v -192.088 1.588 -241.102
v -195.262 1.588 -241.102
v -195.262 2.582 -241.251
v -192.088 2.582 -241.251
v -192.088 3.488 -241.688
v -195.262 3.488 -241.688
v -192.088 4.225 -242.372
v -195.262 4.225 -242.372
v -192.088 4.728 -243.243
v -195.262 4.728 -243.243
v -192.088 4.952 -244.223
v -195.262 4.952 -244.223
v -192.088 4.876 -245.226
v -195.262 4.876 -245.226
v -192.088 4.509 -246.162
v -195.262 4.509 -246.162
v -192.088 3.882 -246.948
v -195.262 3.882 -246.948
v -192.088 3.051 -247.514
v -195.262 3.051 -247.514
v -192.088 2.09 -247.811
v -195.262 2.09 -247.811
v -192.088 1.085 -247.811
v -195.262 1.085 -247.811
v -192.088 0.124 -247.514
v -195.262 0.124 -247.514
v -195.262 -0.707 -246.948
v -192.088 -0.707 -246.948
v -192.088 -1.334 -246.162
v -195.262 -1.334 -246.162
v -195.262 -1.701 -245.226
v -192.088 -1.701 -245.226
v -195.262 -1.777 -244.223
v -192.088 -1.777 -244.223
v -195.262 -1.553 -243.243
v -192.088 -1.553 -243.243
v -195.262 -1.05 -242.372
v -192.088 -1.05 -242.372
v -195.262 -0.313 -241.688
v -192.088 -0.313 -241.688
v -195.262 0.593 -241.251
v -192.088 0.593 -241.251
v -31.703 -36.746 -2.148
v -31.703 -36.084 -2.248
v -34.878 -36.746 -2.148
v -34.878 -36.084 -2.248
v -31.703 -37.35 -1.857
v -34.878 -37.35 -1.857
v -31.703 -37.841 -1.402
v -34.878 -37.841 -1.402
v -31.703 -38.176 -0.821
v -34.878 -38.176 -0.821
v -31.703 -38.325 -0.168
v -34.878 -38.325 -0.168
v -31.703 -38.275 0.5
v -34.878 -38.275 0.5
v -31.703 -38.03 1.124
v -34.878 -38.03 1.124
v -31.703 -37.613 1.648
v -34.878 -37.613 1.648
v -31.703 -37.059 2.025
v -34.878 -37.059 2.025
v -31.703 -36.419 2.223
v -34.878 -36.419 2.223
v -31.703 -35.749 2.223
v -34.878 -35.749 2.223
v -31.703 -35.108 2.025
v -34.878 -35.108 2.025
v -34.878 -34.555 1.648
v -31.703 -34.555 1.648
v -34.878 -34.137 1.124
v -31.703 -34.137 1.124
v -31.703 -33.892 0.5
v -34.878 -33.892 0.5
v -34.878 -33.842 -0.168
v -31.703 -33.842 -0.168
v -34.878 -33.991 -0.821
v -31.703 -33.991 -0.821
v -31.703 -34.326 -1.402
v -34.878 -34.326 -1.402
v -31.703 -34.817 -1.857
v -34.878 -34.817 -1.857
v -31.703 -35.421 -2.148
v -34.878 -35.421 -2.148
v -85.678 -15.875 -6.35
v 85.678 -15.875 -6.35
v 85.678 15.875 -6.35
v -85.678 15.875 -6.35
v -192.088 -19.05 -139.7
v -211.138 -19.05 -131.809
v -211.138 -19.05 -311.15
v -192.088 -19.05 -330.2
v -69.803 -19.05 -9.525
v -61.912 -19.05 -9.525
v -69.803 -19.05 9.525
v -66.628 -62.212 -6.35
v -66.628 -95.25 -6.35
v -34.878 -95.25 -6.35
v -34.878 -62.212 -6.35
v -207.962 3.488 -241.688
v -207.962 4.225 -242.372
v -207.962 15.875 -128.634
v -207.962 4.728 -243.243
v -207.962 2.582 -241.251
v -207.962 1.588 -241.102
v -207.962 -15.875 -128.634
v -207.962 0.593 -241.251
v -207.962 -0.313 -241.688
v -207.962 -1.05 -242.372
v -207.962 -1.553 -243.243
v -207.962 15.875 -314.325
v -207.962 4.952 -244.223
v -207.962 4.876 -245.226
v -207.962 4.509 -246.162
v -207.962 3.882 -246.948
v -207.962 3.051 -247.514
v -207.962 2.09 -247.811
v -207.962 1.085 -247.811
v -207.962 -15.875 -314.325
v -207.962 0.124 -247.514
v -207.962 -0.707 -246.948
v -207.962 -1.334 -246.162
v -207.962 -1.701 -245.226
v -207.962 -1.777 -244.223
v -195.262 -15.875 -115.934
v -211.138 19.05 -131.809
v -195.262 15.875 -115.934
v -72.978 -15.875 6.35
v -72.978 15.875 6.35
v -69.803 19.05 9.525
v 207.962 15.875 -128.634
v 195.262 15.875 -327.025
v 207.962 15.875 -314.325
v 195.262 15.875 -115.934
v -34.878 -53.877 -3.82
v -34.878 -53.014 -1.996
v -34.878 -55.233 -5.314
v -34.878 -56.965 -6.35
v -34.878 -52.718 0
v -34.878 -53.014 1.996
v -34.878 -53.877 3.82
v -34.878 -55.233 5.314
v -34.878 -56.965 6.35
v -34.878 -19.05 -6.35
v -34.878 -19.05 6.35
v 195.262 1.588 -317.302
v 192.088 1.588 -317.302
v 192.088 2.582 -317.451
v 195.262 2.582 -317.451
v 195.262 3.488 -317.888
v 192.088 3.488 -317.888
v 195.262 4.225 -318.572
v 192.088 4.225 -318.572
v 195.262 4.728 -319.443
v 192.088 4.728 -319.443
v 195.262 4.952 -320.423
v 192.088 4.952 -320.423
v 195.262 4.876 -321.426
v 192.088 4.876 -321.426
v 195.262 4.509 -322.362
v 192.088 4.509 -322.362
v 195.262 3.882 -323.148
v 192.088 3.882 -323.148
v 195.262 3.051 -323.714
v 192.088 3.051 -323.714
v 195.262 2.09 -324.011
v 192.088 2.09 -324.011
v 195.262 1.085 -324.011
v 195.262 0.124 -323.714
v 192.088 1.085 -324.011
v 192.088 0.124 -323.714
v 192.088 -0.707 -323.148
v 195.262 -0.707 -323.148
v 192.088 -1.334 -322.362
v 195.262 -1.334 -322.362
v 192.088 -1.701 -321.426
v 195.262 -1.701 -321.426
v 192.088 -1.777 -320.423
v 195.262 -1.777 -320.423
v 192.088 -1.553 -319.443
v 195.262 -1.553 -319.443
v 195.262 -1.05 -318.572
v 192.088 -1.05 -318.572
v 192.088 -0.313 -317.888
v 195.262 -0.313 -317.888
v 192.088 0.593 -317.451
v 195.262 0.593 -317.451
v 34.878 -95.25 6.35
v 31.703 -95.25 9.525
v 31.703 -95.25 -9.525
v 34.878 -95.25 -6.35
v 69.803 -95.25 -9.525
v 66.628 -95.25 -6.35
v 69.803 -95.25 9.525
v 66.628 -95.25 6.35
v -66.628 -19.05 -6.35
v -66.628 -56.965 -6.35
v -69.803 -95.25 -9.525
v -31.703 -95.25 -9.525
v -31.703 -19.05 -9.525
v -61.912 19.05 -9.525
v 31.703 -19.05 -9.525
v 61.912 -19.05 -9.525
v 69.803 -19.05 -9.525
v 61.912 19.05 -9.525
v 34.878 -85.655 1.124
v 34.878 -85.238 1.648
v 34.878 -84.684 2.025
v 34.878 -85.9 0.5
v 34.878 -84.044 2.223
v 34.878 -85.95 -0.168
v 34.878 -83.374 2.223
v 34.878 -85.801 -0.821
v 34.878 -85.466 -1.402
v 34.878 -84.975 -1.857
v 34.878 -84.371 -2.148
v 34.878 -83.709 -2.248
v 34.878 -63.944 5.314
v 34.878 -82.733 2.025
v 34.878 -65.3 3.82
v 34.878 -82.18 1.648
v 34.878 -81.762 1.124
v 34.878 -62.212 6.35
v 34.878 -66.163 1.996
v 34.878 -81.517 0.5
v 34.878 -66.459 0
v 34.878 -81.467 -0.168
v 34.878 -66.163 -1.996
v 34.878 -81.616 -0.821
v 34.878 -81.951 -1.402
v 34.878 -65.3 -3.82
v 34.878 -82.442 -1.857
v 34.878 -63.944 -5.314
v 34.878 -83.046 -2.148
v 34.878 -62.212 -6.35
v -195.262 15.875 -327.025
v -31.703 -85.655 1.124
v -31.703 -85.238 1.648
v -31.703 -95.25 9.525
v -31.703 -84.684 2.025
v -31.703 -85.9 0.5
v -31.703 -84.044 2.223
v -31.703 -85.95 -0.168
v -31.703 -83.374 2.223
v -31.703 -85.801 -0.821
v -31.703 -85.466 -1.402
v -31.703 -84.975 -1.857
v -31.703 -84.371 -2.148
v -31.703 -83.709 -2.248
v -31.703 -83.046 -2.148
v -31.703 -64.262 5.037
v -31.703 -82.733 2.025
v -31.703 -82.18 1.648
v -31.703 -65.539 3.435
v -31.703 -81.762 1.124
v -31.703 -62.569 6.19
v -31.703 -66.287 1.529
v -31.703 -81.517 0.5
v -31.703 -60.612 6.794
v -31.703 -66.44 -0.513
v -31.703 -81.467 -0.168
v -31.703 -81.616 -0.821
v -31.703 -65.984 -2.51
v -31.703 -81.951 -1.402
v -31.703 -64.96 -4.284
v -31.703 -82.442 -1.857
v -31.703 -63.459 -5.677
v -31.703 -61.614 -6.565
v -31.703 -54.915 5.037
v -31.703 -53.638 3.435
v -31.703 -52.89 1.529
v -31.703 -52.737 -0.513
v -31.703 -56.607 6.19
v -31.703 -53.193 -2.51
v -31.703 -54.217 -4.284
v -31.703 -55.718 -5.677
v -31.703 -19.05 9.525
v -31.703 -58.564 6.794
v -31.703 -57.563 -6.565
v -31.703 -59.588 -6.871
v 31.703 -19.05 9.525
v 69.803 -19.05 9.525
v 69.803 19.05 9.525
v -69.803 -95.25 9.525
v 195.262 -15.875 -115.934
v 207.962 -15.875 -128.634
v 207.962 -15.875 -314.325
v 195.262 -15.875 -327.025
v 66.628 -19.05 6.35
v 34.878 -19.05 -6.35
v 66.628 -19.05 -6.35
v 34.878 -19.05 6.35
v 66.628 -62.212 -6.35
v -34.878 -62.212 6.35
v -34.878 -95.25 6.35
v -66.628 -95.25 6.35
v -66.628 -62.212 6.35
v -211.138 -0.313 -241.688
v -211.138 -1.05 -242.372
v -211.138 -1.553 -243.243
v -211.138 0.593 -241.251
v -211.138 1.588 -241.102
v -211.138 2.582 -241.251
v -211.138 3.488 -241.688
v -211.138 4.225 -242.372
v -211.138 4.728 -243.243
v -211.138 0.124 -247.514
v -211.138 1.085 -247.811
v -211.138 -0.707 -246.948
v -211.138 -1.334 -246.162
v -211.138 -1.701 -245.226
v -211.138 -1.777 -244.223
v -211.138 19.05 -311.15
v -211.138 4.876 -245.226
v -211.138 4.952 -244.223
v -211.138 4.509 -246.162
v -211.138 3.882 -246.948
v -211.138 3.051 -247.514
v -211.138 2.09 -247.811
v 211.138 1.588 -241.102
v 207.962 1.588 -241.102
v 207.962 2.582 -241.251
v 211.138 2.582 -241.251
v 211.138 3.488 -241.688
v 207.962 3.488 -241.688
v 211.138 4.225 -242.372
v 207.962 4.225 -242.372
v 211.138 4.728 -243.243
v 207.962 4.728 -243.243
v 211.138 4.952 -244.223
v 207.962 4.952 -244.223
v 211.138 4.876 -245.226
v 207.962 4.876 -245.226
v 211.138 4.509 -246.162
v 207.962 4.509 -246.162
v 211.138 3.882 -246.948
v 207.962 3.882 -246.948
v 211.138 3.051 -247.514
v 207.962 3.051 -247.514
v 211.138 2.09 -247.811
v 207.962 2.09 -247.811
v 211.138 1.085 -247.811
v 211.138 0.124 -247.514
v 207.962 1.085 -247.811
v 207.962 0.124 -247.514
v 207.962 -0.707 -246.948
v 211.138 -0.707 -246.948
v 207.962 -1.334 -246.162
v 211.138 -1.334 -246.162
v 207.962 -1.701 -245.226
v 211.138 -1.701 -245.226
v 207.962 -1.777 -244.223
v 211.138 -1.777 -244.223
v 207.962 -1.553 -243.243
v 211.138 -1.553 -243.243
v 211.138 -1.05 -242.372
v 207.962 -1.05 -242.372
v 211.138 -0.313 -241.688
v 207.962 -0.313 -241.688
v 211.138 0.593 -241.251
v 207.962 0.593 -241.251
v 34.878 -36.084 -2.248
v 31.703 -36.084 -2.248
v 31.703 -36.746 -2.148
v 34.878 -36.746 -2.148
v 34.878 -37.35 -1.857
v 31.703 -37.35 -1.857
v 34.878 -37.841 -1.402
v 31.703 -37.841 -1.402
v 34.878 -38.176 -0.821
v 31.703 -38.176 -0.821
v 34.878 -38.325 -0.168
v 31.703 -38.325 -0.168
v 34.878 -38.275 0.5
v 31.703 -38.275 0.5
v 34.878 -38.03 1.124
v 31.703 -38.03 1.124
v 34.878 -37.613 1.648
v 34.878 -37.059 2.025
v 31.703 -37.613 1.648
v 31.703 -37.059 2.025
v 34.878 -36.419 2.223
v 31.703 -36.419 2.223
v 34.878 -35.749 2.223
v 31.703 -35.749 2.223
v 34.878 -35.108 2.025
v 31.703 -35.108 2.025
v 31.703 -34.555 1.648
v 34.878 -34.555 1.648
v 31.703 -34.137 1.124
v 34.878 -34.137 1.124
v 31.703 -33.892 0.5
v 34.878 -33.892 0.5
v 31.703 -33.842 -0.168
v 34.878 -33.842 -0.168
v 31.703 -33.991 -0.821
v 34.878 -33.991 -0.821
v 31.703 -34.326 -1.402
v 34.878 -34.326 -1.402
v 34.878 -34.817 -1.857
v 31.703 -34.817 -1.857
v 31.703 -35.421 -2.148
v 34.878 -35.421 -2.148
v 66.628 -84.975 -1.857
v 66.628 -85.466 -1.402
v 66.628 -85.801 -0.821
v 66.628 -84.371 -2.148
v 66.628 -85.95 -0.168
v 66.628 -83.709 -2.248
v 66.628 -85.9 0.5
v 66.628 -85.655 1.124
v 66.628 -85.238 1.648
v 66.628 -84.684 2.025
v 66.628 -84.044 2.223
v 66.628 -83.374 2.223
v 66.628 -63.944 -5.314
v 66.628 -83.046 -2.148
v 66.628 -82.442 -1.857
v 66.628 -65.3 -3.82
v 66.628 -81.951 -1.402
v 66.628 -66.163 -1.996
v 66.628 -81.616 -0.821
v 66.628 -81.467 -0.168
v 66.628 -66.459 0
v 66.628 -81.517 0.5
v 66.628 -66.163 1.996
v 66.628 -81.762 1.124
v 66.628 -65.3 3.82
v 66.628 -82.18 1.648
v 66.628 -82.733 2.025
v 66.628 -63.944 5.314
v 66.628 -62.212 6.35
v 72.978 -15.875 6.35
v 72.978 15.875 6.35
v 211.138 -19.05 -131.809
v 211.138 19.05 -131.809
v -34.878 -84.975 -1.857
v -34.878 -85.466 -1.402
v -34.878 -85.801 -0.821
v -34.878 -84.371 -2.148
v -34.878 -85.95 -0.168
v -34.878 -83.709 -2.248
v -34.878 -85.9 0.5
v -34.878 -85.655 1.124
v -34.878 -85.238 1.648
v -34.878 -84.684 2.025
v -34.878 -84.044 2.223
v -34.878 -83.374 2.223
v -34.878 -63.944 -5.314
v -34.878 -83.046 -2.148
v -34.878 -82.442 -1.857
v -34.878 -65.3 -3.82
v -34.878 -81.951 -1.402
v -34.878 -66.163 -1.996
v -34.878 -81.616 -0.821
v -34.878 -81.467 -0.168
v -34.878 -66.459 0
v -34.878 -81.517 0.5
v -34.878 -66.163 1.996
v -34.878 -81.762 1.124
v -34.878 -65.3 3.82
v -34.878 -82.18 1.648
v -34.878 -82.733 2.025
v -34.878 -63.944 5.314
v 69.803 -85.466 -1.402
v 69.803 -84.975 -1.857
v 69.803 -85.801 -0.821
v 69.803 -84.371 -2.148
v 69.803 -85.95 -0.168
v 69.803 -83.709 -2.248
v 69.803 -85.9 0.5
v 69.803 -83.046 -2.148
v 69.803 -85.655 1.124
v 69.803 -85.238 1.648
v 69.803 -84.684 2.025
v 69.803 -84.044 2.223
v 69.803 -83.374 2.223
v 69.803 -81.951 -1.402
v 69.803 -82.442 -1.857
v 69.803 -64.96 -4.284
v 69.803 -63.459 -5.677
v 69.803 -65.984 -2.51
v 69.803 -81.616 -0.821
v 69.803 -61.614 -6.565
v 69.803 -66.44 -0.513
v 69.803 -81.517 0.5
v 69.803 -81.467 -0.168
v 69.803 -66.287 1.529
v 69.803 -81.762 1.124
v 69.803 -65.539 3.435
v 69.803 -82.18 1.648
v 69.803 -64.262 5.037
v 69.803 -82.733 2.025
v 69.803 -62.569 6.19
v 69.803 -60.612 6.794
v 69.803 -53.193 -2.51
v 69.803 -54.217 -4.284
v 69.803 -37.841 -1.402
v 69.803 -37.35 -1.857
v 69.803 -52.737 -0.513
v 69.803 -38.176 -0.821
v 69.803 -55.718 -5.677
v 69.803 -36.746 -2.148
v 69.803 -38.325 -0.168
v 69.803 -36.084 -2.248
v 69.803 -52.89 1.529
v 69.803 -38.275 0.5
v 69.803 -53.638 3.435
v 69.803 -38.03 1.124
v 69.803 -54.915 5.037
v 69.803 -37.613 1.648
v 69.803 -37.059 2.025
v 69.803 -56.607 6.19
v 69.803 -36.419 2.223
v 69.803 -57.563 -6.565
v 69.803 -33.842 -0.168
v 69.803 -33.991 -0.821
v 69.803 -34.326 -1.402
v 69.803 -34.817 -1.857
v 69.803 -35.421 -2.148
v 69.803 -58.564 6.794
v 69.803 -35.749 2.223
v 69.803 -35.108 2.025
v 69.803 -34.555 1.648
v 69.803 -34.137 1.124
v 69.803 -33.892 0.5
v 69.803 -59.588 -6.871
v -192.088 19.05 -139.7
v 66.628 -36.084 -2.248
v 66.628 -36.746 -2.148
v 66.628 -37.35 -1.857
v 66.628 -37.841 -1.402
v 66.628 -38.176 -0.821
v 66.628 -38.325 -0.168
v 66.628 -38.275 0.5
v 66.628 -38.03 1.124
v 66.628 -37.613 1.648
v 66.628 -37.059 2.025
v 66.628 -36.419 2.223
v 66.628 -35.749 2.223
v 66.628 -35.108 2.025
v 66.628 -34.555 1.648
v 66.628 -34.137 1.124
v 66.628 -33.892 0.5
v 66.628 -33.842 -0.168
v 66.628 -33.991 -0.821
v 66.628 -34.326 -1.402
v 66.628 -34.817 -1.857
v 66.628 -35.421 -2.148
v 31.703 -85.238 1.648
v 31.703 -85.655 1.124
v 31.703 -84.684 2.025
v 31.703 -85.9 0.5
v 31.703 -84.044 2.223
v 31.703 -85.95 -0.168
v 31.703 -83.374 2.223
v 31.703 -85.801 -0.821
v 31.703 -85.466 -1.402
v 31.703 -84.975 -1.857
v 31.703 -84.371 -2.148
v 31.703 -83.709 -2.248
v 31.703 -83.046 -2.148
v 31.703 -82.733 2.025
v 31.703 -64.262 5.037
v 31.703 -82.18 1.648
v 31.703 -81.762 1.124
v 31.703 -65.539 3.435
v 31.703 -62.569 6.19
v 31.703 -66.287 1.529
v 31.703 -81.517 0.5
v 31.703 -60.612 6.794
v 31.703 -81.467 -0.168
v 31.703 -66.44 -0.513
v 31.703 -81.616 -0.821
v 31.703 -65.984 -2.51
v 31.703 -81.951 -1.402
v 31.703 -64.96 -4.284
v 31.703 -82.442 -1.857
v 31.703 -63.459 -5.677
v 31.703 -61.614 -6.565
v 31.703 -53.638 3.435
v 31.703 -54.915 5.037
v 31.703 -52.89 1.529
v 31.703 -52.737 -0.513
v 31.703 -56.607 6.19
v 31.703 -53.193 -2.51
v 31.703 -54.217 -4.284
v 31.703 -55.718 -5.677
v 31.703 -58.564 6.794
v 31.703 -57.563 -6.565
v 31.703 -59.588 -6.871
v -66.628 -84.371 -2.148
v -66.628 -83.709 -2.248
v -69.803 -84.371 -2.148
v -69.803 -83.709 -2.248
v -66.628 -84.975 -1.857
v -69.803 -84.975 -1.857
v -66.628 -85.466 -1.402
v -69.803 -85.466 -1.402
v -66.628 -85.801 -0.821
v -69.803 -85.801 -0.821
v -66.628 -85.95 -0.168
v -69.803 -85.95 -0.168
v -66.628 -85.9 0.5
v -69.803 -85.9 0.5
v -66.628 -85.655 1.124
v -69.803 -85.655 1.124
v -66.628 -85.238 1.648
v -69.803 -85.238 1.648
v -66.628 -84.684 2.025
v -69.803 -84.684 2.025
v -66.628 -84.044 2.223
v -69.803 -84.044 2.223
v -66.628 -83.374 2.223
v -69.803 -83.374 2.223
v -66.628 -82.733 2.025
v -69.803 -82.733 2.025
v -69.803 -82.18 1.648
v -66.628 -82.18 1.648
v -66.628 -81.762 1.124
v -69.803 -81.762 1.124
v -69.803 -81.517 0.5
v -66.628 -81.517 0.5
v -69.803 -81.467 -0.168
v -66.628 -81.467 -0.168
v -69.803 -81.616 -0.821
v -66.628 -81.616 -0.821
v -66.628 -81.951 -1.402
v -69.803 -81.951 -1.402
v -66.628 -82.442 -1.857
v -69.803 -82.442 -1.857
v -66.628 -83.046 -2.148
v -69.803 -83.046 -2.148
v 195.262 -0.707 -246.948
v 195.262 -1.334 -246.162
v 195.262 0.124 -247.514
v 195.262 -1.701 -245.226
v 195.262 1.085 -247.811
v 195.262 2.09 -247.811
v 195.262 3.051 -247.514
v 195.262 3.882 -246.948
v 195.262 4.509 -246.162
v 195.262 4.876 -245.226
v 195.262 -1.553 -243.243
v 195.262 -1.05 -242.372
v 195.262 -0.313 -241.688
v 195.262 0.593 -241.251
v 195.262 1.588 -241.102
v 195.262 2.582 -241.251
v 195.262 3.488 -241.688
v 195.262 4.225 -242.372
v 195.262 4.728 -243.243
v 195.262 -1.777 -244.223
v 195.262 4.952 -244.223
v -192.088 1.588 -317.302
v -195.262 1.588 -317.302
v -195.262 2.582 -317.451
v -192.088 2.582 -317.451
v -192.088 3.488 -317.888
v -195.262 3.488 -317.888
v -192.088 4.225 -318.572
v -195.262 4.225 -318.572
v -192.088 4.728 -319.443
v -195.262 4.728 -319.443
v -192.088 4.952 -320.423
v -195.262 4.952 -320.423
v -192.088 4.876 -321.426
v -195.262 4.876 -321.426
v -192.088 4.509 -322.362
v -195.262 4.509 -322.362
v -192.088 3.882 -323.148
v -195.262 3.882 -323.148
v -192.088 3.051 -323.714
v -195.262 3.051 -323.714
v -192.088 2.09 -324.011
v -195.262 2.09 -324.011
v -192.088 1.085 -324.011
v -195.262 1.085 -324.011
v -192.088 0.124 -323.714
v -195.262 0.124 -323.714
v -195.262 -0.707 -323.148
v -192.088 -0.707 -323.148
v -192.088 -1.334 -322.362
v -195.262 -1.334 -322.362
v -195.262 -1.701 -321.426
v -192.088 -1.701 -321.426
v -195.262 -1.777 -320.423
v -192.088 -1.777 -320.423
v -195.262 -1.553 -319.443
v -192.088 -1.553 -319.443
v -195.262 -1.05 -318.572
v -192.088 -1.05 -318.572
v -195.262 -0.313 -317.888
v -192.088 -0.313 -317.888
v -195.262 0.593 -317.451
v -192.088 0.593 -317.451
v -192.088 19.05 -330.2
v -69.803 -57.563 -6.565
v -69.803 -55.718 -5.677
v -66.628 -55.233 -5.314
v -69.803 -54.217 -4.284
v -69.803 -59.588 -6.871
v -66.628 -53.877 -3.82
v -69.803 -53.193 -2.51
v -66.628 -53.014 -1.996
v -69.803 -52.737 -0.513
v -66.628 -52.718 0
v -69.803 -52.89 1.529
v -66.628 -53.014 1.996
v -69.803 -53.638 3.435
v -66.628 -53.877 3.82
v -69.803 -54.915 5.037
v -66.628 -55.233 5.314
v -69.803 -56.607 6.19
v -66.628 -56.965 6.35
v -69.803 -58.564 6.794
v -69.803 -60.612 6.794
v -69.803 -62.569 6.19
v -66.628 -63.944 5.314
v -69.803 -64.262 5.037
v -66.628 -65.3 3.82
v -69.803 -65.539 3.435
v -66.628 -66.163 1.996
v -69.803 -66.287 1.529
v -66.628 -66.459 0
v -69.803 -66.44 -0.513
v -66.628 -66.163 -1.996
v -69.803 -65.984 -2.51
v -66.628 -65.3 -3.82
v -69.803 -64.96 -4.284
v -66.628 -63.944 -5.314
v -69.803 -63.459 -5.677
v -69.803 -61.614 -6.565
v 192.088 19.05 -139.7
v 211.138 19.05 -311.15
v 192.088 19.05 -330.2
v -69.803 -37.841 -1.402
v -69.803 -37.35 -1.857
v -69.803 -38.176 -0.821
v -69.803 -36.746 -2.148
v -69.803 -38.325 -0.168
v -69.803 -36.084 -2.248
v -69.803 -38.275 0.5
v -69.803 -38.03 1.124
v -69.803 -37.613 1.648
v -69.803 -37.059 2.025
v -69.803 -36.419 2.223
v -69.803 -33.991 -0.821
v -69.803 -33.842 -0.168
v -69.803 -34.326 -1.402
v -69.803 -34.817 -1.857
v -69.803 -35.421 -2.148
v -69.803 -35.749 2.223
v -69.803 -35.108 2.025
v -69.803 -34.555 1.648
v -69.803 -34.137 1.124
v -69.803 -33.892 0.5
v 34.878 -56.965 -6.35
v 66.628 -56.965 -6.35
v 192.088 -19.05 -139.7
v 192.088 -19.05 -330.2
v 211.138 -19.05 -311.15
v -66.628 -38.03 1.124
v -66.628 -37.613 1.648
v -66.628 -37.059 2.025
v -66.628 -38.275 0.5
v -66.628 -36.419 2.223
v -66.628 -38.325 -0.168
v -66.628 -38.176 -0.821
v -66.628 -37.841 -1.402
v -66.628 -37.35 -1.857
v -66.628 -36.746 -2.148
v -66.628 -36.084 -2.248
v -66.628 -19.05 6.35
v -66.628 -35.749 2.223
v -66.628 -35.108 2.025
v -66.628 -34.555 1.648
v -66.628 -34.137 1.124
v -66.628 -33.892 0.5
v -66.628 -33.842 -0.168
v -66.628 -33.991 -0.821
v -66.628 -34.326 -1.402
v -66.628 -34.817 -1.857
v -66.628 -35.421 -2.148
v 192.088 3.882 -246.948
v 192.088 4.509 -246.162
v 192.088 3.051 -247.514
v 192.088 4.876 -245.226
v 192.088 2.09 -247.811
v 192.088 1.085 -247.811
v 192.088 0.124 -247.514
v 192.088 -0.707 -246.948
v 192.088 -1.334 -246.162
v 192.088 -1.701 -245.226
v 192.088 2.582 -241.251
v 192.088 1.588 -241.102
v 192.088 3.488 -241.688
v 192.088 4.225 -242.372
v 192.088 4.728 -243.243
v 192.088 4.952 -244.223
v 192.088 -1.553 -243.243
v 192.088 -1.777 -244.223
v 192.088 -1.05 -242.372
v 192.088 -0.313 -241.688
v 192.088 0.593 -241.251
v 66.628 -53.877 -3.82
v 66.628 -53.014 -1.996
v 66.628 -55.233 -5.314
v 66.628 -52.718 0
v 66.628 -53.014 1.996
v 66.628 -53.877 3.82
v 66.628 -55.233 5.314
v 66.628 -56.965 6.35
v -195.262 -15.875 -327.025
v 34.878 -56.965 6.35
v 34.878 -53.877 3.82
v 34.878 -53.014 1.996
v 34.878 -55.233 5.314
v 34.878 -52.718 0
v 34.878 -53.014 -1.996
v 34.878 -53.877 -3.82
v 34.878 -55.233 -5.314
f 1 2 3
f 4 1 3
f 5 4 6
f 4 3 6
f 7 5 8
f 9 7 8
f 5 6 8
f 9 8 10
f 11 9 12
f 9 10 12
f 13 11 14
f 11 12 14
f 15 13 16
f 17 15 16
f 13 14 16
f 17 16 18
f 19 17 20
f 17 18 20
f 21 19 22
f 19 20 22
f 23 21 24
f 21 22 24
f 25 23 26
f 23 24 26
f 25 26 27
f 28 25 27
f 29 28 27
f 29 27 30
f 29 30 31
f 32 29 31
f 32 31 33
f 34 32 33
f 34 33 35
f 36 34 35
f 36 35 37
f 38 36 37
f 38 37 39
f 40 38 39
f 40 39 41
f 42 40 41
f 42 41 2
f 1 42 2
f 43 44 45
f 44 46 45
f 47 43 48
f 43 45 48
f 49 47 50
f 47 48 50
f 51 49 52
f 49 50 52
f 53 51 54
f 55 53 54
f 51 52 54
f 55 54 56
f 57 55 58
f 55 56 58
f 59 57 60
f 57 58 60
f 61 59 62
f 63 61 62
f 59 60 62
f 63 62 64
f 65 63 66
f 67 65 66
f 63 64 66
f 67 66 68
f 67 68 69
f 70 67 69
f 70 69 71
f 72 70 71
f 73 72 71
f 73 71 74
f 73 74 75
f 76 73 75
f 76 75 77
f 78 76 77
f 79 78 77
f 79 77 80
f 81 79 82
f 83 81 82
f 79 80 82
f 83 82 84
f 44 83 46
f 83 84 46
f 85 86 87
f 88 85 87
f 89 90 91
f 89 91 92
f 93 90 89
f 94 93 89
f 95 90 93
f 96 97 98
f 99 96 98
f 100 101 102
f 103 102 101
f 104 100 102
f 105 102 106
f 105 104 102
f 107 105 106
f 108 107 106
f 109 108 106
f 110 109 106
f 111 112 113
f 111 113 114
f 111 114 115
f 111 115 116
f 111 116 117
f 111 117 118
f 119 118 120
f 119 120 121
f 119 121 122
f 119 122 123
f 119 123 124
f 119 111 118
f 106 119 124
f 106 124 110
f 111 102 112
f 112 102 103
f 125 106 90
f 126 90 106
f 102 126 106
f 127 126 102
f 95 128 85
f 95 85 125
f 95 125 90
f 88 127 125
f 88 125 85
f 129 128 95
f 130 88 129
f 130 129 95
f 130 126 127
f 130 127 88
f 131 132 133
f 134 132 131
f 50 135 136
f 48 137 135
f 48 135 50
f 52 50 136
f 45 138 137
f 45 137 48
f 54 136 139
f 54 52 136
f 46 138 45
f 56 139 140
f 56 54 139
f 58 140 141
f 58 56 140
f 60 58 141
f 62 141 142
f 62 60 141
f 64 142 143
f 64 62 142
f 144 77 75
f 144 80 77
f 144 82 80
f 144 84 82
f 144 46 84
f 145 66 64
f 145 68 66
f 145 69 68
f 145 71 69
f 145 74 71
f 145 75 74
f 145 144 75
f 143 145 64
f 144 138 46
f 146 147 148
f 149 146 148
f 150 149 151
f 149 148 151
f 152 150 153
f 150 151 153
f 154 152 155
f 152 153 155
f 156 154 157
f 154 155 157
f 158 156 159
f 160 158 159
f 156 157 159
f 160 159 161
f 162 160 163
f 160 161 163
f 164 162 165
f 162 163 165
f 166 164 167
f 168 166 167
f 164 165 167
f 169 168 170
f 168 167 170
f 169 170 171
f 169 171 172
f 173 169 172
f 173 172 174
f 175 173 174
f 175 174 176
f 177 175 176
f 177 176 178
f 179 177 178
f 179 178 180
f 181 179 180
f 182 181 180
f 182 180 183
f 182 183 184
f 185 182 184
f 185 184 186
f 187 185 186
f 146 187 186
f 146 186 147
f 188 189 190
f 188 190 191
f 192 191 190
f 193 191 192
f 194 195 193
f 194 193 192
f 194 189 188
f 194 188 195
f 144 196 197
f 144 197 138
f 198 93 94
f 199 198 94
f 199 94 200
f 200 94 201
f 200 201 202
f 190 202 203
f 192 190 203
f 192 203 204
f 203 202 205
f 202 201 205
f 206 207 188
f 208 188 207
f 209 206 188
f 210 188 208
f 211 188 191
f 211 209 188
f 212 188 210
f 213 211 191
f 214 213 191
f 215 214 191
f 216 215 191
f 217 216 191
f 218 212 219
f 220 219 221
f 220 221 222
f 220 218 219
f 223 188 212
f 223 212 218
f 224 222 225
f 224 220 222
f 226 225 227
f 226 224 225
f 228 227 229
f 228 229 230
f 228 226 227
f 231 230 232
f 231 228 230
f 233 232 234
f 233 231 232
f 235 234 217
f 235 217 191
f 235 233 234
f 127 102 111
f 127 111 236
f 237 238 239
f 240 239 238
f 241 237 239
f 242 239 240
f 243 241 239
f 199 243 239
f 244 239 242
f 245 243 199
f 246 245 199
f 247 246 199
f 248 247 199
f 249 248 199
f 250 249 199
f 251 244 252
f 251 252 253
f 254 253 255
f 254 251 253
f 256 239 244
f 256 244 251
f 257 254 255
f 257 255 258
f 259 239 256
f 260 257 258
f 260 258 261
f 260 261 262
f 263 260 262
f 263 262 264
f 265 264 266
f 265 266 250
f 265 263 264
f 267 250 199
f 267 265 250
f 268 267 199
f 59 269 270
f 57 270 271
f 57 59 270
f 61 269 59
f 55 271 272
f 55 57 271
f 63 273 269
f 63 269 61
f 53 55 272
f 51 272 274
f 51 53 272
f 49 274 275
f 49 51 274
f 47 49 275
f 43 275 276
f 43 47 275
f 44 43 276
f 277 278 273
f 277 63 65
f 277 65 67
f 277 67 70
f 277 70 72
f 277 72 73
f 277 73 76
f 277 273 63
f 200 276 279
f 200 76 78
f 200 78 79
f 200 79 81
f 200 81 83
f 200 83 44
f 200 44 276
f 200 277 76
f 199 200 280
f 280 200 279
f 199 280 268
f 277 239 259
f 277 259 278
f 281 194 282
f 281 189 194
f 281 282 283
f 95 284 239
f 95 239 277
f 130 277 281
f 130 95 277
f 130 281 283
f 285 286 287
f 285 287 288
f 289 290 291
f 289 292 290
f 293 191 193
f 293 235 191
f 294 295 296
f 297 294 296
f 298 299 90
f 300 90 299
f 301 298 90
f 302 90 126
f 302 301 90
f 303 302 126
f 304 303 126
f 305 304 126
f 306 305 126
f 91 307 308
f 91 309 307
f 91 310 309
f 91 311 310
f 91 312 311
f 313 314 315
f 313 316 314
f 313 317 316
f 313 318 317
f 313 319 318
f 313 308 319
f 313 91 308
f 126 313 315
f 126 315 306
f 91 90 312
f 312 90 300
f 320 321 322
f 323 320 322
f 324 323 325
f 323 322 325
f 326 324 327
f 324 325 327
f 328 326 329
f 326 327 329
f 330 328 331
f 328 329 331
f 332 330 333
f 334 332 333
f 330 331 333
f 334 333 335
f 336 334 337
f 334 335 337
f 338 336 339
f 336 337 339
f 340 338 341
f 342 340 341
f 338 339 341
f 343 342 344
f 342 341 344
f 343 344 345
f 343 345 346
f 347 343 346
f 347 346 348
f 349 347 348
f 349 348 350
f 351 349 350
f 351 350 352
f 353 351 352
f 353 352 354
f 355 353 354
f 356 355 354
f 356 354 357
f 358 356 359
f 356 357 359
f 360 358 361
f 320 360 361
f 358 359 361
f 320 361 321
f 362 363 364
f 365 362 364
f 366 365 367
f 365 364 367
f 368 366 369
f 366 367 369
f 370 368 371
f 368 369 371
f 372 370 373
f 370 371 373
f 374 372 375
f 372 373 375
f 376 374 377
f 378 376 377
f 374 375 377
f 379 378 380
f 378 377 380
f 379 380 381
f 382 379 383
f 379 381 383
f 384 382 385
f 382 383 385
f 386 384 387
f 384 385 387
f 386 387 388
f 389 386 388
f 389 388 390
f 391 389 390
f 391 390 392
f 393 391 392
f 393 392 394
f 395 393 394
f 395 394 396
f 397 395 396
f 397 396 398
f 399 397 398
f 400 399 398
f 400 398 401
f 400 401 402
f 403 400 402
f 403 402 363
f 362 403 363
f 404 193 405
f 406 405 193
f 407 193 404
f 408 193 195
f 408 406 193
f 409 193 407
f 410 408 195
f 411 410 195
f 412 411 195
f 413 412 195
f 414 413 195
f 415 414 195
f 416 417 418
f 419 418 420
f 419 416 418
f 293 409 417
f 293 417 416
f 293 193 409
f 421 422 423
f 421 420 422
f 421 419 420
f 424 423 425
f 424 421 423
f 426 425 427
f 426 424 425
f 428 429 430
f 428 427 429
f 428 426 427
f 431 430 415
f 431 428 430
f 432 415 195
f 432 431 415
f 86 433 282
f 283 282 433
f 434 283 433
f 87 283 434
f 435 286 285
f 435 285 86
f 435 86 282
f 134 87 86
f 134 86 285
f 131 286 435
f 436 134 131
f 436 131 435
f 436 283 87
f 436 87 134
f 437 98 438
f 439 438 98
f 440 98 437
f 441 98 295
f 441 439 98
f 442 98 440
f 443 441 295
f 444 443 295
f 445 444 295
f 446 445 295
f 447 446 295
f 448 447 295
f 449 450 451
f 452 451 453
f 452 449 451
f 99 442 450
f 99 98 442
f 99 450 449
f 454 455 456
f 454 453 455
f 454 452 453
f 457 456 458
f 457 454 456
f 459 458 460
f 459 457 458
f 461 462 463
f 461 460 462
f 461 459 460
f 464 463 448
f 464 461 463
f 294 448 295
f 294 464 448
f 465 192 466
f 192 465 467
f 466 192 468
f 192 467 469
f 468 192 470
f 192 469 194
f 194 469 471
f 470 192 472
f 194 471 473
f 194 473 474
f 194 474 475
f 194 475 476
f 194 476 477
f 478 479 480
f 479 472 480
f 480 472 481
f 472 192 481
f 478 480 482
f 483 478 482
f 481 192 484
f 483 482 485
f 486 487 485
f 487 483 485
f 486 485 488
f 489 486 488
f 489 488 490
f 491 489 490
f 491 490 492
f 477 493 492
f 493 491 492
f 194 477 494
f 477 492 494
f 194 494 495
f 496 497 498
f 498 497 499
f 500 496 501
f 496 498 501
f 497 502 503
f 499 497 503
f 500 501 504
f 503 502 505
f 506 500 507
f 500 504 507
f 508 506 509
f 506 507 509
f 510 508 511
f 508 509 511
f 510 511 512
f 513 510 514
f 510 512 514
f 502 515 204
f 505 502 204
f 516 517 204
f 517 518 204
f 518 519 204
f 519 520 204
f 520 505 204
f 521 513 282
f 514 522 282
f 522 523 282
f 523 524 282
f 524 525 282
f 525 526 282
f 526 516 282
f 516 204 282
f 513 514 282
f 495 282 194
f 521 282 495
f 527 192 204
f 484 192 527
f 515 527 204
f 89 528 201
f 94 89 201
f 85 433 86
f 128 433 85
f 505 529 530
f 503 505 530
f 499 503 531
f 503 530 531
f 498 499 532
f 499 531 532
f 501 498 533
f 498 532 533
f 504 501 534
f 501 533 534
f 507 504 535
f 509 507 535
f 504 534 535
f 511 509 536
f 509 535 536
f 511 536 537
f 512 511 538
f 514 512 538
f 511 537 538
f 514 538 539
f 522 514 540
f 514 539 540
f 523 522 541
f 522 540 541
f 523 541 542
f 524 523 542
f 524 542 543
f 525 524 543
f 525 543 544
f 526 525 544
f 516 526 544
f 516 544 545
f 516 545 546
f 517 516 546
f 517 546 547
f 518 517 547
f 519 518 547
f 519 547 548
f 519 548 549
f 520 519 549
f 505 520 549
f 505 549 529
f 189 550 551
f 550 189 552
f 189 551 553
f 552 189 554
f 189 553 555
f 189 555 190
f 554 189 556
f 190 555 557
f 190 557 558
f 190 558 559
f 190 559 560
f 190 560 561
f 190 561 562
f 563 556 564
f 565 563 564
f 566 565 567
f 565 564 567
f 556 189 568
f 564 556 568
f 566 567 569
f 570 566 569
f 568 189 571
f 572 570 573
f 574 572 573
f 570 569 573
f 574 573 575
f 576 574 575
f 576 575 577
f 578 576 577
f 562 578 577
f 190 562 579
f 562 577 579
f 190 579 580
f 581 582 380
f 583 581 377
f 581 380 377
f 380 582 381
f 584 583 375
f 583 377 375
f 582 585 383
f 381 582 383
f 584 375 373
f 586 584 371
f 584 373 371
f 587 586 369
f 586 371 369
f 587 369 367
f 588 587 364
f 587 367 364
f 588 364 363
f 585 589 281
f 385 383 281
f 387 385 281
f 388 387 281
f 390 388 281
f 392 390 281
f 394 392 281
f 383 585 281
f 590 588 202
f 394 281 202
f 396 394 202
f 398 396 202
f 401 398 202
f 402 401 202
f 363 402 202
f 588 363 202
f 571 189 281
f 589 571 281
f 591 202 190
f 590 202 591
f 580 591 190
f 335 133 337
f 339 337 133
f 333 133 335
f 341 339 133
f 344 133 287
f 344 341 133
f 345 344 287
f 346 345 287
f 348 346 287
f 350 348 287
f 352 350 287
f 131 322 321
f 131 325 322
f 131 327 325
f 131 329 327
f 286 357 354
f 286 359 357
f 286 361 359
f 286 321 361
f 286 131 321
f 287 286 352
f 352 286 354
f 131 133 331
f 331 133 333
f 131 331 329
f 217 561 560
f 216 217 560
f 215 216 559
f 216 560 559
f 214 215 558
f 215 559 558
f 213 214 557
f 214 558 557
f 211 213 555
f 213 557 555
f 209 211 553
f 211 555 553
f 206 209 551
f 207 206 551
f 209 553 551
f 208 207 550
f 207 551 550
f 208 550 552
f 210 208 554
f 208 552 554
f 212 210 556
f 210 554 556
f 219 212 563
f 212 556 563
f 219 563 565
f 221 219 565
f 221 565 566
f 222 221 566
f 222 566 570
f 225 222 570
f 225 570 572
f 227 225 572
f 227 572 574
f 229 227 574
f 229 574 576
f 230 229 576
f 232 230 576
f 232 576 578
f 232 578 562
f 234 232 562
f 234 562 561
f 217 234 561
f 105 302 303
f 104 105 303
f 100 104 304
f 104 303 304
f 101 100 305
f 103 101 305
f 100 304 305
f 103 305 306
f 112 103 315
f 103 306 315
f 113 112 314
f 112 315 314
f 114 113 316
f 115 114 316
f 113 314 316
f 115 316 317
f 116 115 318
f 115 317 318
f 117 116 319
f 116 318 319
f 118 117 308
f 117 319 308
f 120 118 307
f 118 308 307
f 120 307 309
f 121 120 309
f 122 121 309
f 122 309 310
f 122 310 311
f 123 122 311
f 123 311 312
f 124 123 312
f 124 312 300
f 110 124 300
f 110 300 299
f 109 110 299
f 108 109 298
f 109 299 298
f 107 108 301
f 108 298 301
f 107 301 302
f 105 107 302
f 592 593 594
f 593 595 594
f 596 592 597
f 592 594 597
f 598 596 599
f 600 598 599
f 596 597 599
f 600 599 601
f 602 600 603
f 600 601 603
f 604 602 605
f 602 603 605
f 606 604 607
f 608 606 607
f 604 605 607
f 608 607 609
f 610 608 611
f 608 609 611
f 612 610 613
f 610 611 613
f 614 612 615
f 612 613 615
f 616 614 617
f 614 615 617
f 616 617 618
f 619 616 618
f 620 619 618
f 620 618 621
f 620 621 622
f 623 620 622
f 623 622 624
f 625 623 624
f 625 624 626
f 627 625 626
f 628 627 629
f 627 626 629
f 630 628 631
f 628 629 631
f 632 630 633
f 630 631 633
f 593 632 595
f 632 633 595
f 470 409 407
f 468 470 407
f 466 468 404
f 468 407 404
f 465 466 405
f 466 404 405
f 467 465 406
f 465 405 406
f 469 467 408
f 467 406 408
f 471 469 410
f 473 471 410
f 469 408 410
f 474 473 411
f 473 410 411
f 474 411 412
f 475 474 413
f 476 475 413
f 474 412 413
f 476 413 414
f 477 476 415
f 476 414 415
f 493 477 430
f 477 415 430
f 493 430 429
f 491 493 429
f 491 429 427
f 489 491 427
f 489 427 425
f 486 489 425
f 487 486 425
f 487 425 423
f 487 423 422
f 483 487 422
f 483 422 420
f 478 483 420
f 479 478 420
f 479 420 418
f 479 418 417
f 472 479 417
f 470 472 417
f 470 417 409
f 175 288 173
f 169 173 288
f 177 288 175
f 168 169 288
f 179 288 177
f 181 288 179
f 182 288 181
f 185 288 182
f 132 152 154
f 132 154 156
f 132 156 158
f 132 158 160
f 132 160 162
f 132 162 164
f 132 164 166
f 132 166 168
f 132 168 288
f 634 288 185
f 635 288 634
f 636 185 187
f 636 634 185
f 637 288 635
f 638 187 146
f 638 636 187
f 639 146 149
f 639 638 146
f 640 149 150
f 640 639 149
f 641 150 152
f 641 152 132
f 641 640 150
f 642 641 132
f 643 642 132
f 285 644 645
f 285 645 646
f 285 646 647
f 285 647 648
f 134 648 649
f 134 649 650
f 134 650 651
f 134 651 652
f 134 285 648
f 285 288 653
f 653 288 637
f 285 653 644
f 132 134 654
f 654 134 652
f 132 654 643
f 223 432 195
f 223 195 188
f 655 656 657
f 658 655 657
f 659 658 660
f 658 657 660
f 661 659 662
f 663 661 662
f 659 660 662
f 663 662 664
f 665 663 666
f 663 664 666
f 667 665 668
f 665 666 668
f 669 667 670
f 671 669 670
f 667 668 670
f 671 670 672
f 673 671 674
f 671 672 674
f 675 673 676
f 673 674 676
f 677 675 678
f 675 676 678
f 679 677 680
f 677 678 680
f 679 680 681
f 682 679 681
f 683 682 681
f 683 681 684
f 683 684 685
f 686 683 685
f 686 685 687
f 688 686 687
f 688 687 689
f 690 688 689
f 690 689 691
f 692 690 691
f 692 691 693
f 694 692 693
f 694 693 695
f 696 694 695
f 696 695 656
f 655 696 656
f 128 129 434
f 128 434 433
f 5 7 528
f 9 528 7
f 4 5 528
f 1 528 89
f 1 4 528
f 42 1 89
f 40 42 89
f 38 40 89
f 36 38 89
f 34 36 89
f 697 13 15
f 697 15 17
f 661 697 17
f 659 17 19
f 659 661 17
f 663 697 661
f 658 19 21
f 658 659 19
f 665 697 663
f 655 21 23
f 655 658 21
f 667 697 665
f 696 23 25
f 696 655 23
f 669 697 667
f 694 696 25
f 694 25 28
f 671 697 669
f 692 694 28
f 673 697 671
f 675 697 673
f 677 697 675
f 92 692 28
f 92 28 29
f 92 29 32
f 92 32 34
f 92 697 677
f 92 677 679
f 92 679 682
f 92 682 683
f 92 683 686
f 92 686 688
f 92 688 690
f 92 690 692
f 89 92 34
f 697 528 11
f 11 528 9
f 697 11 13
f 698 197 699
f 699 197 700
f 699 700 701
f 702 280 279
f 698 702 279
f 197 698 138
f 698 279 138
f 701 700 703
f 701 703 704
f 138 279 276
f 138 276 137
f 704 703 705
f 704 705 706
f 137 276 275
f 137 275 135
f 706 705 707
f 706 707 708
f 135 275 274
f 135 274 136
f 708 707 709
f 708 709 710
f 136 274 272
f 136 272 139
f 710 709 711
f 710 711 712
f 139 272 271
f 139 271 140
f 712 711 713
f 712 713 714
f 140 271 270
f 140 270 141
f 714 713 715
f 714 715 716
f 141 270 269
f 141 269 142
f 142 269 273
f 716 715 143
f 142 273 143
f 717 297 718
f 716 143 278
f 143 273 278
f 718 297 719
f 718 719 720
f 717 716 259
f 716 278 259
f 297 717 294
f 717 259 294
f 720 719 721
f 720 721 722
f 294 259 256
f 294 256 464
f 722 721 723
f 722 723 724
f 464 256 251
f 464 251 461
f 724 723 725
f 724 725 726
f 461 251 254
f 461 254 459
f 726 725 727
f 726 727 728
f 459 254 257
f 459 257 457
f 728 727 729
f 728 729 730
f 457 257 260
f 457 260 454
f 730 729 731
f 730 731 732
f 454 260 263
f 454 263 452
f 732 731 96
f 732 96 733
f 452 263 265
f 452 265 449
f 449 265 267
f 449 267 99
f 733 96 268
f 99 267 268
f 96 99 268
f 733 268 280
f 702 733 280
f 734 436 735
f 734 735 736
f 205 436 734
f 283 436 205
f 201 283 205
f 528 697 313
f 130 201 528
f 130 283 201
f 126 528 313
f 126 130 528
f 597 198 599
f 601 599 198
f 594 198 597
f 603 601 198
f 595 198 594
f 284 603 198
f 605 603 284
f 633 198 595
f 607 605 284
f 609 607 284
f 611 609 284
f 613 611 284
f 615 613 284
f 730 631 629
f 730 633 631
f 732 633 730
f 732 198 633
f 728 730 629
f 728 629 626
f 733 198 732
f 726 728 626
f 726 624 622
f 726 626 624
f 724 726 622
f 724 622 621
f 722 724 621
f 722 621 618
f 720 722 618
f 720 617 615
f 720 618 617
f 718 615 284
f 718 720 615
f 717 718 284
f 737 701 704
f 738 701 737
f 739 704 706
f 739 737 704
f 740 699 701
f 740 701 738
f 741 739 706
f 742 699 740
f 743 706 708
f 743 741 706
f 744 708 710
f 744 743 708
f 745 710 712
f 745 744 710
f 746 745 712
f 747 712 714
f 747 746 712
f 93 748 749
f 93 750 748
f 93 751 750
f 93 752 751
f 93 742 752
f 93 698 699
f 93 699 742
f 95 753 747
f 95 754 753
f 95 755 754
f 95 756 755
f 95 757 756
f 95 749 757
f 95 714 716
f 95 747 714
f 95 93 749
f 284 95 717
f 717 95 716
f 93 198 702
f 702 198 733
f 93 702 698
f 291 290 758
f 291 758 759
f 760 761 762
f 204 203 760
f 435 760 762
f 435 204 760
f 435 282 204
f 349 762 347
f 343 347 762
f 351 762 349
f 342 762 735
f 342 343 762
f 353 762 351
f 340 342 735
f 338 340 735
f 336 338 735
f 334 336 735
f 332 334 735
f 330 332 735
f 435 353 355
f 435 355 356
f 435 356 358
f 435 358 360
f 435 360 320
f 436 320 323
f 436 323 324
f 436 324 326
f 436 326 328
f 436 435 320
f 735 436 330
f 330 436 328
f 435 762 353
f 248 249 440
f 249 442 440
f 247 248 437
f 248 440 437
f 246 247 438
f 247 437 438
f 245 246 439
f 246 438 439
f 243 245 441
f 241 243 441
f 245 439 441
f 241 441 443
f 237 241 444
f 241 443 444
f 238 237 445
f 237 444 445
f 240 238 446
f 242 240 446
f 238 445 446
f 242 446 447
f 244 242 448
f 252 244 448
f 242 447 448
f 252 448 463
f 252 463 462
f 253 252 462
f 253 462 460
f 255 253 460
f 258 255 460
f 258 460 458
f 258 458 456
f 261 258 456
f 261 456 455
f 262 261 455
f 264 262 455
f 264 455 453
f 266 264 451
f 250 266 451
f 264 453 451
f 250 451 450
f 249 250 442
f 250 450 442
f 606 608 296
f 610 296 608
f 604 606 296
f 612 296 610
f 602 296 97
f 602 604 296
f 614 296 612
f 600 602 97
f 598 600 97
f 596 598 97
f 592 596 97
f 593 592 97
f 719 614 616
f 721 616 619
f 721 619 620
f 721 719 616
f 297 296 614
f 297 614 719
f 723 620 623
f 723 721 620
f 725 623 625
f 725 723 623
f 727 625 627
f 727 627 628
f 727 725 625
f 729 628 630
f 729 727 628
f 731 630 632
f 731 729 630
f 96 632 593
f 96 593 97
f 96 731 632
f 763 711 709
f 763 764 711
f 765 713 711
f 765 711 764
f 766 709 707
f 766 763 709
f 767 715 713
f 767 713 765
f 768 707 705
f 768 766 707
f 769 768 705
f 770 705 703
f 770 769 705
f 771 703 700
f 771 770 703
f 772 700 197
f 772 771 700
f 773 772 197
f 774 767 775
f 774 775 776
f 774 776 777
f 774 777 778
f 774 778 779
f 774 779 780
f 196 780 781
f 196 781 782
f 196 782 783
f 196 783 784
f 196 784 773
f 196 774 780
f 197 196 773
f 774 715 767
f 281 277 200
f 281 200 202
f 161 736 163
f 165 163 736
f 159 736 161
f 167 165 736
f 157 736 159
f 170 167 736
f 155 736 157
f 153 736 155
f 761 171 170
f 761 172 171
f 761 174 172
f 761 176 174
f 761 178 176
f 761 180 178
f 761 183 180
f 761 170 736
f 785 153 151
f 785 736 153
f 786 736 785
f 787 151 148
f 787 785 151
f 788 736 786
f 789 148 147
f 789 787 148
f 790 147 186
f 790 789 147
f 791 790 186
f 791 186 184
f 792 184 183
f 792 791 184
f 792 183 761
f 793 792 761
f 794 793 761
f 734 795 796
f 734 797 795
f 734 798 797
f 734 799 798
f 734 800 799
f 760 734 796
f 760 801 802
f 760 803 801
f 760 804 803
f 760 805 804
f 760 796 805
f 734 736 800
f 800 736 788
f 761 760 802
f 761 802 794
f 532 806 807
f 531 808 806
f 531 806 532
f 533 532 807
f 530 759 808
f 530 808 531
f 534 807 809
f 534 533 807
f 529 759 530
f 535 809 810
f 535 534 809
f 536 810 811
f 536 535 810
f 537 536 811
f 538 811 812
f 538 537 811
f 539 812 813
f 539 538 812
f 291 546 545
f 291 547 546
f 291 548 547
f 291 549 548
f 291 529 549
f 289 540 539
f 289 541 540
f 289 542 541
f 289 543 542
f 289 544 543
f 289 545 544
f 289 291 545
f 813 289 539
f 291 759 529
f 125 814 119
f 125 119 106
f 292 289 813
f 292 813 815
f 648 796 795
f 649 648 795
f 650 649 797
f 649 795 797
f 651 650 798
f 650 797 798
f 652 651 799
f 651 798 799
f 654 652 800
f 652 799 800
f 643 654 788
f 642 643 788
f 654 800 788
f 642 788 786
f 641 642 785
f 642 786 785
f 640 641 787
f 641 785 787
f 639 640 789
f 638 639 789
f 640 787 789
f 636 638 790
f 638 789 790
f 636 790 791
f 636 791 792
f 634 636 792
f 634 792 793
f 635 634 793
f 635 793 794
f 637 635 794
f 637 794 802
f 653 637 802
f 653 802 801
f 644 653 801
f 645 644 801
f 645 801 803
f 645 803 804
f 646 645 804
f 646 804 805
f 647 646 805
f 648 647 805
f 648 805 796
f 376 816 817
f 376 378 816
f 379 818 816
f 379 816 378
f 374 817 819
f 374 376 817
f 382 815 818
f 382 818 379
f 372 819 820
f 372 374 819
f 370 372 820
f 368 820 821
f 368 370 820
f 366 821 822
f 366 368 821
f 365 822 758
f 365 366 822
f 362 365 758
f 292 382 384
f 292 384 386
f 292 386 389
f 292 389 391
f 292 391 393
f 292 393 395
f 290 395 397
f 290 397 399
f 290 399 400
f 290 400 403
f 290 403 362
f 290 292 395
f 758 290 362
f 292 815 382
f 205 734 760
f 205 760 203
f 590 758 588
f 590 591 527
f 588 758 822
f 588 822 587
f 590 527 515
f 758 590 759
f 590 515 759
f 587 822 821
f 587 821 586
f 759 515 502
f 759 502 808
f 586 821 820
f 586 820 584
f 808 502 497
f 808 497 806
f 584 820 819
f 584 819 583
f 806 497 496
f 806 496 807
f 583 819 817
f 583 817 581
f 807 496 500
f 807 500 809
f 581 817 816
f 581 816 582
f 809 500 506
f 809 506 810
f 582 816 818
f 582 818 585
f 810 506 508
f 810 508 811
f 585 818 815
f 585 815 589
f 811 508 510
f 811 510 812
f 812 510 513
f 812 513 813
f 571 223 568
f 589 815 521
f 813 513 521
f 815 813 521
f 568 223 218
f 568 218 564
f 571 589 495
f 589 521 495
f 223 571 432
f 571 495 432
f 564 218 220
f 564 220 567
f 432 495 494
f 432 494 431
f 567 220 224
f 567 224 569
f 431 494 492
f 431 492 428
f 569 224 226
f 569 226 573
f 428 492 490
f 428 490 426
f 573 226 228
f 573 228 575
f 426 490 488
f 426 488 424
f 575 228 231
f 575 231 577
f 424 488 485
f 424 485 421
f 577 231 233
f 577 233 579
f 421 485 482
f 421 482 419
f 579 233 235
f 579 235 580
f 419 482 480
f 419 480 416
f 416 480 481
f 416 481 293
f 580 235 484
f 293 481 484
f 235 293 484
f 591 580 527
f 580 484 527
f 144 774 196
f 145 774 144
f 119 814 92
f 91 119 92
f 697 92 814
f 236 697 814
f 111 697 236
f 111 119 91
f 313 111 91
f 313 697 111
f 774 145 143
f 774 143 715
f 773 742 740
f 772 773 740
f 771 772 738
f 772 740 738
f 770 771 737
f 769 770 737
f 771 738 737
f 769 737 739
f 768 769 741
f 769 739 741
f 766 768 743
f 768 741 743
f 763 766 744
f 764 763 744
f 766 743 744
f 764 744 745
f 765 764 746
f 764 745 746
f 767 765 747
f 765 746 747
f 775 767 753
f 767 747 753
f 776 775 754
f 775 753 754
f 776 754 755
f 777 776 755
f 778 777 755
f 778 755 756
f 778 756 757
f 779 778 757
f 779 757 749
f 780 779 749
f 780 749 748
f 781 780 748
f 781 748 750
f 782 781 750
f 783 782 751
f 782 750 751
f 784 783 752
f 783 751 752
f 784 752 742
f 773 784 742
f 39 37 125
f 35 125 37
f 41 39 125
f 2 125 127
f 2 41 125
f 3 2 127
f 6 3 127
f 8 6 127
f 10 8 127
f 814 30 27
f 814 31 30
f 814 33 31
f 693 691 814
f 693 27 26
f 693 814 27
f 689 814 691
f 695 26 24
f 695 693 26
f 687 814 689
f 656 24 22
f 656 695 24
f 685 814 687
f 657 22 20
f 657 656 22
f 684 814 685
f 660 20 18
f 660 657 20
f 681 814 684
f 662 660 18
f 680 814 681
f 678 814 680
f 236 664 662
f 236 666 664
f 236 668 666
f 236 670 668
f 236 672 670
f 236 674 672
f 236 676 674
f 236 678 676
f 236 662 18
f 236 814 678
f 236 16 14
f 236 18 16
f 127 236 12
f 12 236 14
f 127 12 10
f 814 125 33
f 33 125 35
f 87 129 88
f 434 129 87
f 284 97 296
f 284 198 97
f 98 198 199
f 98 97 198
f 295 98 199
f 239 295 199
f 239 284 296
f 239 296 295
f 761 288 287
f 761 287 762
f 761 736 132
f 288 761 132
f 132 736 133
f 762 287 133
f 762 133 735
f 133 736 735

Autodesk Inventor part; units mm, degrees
sketch "Sketch1" plane through (0, 0, 0) normal (0, 1, 0) x (-1, 0, 0)
  line L0 (0, 0) -> (201.6125, 0)
  line L1 (201.6125, 0) -> (201.6125, -330.2)
  line L2 (0, 0) -> (0, -330.2) construction
  line L3 (0, 0) -> (-201.6125, 0)
  line L4 (-201.6125, 0) -> (-201.6125, -330.2)
  dimension "d0" = 201.6125
  dimension "d1" = 330.2
  dimension "d2" = 330.2
ref_plane "Work Plane1" through (0, 0, -330.2) normal (0, 0, 1) x (1, 0, 0)
sketch "Sketch3" plane through (0, 0, -330.2) normal (0, 0, 1) x (1, 0, 0)
  line L0 (211.1375, -19.05) -> (192.0875, -19.05)
  line L1 (192.0875, -19.05) -> (192.0875, 19.05)
  line L2 (192.0875, 19.05) -> (211.1375, 19.05)
  line L3 (211.1375, 19.05) -> (211.1375, -19.05)
  line L4 (211.1375, -19.05) -> (192.0875, 19.05) construction
  line L5 (192.0875, -19.05) -> (211.1375, 19.05) construction
  line L6 (207.9625, -15.875) -> (195.2625, -15.875)
  line L7 (195.2625, -15.875) -> (195.2625, 15.875)
  line L8 (195.2625, 15.875) -> (207.9625, 15.875)
  line L9 (207.9625, 15.875) -> (207.9625, -15.875)
  line L10 (207.9625, -15.875) -> (195.2625, 15.875) construction
  line L11 (195.2625, -15.875) -> (207.9625, 15.875) construction
  point P0 (0, 0)
  point P1 (201.6125, 0)
  dimension "d4" = 38.1
  dimension "d5" = 19.05
  dimension "d6" = 201.6125
  dimension "d7" = 3.175
  dimension "d8" = 3.175
sweep "Sweep1" add profiles "Sketch3" path "Sketch1"
ref_plane "Work Plane2" through (-192.0875, -19.05, -9.525) normal (0, 0, 1) x (1, 0, 0)
sketch "Sketch12" plane through (-211.1375, 19.05, 9.525) normal (0, 1, 0) x (1, 0, 0)
  line L0 (406.4, 15.875) -> (15.875, 15.875) projected
  line L1 (19.05, 19.05) -> (19.05, 339.725) projected
  line L2 (19.05, 149.225) -> (149.225, 19.05)
  line L3 (403.225, 19.05) -> (19.05, 19.05) projected
  line L4 (19.05, 122.2842) -> (122.2842, 19.05)
  line L5 (19.05, 149.225) -> (19.05, 122.2842)
  line L6 (122.2842, 19.05) -> (149.225, 19.05)
  line L7 (211.1375, 9.525) -> (211.1375, 339.725) construction
  line L8 (403.225, 19.05) -> (403.225, 339.725)
  line L9 (403.225, 149.225) -> (273.05, 19.05)
  line L10 (19.05, 19.05) -> (403.225, 19.05)
  line L11 (403.225, 122.2842) -> (299.9908, 19.05)
  dimension "d50" = 130.175
  dimension "d51" = 130.175
  dimension "d52" = 19.05
  dimension "d55" = 330.2
extrude "Extrusion5" add sketch "Sketch12" against normal blind 38.1 contours L9 L8 L11 L3 | L1 L2 L3 L4
sketch "Sketch14" plane through (-211.1375, 19.05, 9.525) normal (0, 1, 0) x (1, 0, 0)
  line L0 (0, 0) -> (0, 339.725) projected
  line L1 (0, 141.3342) -> (141.3342, 0)
  line L2 (422.275, 0) -> (0, 0) projected
  line L3 (19.05, 122.2842) -> (122.2842, 19.05) projected
  line L4 (0, 141.3342) -> (0, 0)
  line L5 (211.1375, 9.525) -> (211.1375, 339.725) construction
  dimension "d58" = 330.2
extrude "Extrusion6" cut sketch "Sketch14" against normal blind 38.1
sketch "Sketch15" plane through (211.1375, 19.05, 9.525) normal (0, 1, 0) x (1, 0, 0)
  line L0 (0, 0) -> (-280.9408, 0) projected
  line L1 (-141.3342, 0) -> (0, 141.3342)
  line L2 (0, 339.725) -> (0, 0) projected
  line L3 (-122.2842, 19.05) -> (-19.05, 122.2842) projected
  line L4 (-141.3342, 0) -> (0, 0)
  point P0 (-211.1375, 9.525)
extrude "Extrusion7" cut sketch "Sketch15" against normal blind 38.1
sketch "Sketch17" plane through (192.0875, 19.05, -330.2) normal (0, 1, 0) x (1, 0, 0)
  line L0 (-384.175, -190.5) -> (-384.175, 0) projected
  line L1 (-384.175, 0) -> (-403.225, -19.05)
  line L2 (-403.225, -198.3908) -> (-403.225, 0) projected
  line L3 (-403.225, -19.05) -> (-403.225, 0)
  line L4 (-403.225, 0) -> (-384.175, 0)
  point P0 (-192.0875, -330.2)
  dimension "d63" = 45
extrude "Extrusion8" cut sketch "Sketch17" against normal through all
sketch "Sketch18" plane through (192.0875, 19.05, -330.2) normal (0, 1, 0) x (1, 0, 0)
  line L0 (0, 0) -> (0, -190.5) projected
  line L1 (0, 0) -> (19.05, -19.05)
  line L2 (19.05, 0) -> (19.05, -198.3908) projected
  line L3 (19.05, -19.05) -> (19.05, 0)
  line L4 (19.05, 0) -> (0, 0) projected
  line L5 (19.05, 0) -> (0, 0)
  point P0 (-192.0875, -330.2)
  dimension "d66" = 45
extrude "Extrusion9" cut sketch "Sketch18" against normal through all
sketch "Sketch19" plane through (-69.8033, -19.05, 9.525) normal (0, -1, 0) x (1, 0, 0)
  line L0 (139.6065, 0) -> (0, 0) projected
  line L1 (131.7158, -19.05) -> (7.8908, -19.05) projected
  line L2 (0, 0) -> (38.1, 0)
  line L3 (38.1, 0) -> (38.1, -19.05)
  line L4 (38.1, -19.05) -> (0, -19.05)
  line L5 (0, -19.05) -> (0, 0)
  line L6 (280.9408, -141.3342) -> (139.6065, 0) projected
  line L7 (139.6065, 0) -> (101.5065, 0)
  line L8 (101.5065, 0) -> (101.5065, -19.05)
  line L9 (101.5065, -19.05) -> (139.6065, -19.05)
  line L10 (139.6065, -19.05) -> (139.6065, 0)
  line L11 (0, -9.525) -> (139.6065, -9.525) construction
  line L12 (120.5565, 0) -> (120.5565, -19.05) construction
  line L13 (19.05, 0) -> (19.05, -19.05) construction
  line L14 (131.7158, -19.05) -> (7.8908, -19.05) construction
  line L15 (3.175, -15.875) -> (34.925, -15.875)
  line L16 (34.925, -15.875) -> (34.925, -3.175)
  line L17 (34.925, -3.175) -> (3.175, -3.175)
  line L18 (3.175, -3.175) -> (3.175, -15.875)
  line L19 (3.175, -15.875) -> (34.925, -3.175) construction
  line L20 (34.925, -15.875) -> (3.175, -3.175) construction
  line L21 (104.6815, -15.875) -> (136.4315, -15.875)
  line L22 (136.4315, -15.875) -> (136.4315, -3.175)
  line L23 (136.4315, -3.175) -> (104.6815, -3.175)
  line L24 (104.6815, -3.175) -> (104.6815, -15.875)
  line L25 (104.6815, -15.875) -> (136.4315, -3.175) construction
  line L26 (136.4315, -15.875) -> (104.6815, -3.175) construction
  point P0 (69.8033, -9.525)
  point P1 (19.05, -9.525)
  point P2 (120.5565, -9.525)
  dimension "d69" = 38.1
  dimension "d70" = 38.1
  dimension "d71" = 3.175
  dimension "d72" = 3.175
  dimension "d73" = 3.175
  dimension "d74" = 3.175
extrude "Extrusion10" add sketch "Sketch19" along normal blind 76.2 contours L10 L9 L1 L8 L0 | L3 L1 L4 L5 L0
sketch "Sketch20" plane through (69.8033, -19.05, 9.525) normal (1, 0, 0) x (0, 0, -1)
  circle A0 centre (9.525, -40.5384) radius 6.8707
  line L0 (141.3342, 0) -> (0, 0) projected
  point P0 (9.525, 19.05)
  dimension "d77" = 13.7414
  dimension "d78" = 40.5384
extrude "Extrusion11" cut sketch "Sketch20" against normal through all
ref_plane "Work Plane4" through (0, 19.05, -139.7) normal (-1, 0, 0) x (0, 0, -1)
ref_plane "Work Plane3" through (-192.0875, 19.05, -139.7) normal (-1, 0, 0) x (0, 0, -1)
sketch "Sketch21" plane through (-211.1375, -19.05, -131.8092) normal (-1, 0, 0) x (0, 0, 1)
  line L0 (-179.3408, 38.1) -> (-179.3408, 0) projected
  line L1 (0, 0) -> (-179.3408, 0) projected
  line L2 (0, 0) -> (0, 38.1) projected
  line L3 (0, 38.1) -> (-179.3408, 38.1) projected
  circle A0 centre (-112.6658, 20.6375) radius 3.3735 projected
  circle A1 centre (-188.8658, 20.6375) radius 3.3735 projected
  point P0 (131.8092, 19.05)
extrude "Extrusion12" cut sketch "Sketch21" against normal through all contours A0 | A1
sketch "Sketch22" plane through (69.8033, -19.05, 9.525) normal (1, 0, 0) x (0, 0, -1)
  circle A0 centre (9.525, -40.8462) radius 23.8125 construction
  arc A1 (15.875, -37.9147) -> (3.175, -37.9147) centre (9.525, -40.5384) ccw construction
  line L0 (9.525, -40.5384) -> (9.525, -17.0337) construction
  line L1 (9.525, -40.5384) -> (9.525, -64.6587) construction
  point P0 (9.525, 19.05)
  point P1 (-29.4266, 19.05)
  dimension "d84" = 47.625
hole "Hole3" at (69.8033, 0, 38.9516) at (69.8033, -36.0837, 0) at (69.8033, -83.7087, 0) direction (-1, 0, 0) diameter 4.4958 end through all
equation "\"d0\" = 0.5 * width"
equation "\"d1\" = length"
equation "\"d2\" = length"
equation "\"d4\" = tubingLength"
equation "\"d5\" = tubingWidth"
equation "\"d6\" = 0.5 * width"
equation "\"d7\" = tubeingWallWidth"
equation "\"d8\" = tubeingWallWidth"
equation "\"d55\" = length"
equation "\"d58\" = length"
equation "\"d77\" = diamForAxel"
equation "\"width\" = 403.225"
equation "\"length\" = 330.2"
equation "\"tubingWidth\" = 19.05"
equation "\"tubingLength\" = 38.1"
equation "\"tubeingWallWidth\" = 3.175"
equation "\"d3\" = -length"
equation "\"diamForAxel\" = 13.7414"
properties part number "ShooterFrameV02" material "Aluminum 6061"
